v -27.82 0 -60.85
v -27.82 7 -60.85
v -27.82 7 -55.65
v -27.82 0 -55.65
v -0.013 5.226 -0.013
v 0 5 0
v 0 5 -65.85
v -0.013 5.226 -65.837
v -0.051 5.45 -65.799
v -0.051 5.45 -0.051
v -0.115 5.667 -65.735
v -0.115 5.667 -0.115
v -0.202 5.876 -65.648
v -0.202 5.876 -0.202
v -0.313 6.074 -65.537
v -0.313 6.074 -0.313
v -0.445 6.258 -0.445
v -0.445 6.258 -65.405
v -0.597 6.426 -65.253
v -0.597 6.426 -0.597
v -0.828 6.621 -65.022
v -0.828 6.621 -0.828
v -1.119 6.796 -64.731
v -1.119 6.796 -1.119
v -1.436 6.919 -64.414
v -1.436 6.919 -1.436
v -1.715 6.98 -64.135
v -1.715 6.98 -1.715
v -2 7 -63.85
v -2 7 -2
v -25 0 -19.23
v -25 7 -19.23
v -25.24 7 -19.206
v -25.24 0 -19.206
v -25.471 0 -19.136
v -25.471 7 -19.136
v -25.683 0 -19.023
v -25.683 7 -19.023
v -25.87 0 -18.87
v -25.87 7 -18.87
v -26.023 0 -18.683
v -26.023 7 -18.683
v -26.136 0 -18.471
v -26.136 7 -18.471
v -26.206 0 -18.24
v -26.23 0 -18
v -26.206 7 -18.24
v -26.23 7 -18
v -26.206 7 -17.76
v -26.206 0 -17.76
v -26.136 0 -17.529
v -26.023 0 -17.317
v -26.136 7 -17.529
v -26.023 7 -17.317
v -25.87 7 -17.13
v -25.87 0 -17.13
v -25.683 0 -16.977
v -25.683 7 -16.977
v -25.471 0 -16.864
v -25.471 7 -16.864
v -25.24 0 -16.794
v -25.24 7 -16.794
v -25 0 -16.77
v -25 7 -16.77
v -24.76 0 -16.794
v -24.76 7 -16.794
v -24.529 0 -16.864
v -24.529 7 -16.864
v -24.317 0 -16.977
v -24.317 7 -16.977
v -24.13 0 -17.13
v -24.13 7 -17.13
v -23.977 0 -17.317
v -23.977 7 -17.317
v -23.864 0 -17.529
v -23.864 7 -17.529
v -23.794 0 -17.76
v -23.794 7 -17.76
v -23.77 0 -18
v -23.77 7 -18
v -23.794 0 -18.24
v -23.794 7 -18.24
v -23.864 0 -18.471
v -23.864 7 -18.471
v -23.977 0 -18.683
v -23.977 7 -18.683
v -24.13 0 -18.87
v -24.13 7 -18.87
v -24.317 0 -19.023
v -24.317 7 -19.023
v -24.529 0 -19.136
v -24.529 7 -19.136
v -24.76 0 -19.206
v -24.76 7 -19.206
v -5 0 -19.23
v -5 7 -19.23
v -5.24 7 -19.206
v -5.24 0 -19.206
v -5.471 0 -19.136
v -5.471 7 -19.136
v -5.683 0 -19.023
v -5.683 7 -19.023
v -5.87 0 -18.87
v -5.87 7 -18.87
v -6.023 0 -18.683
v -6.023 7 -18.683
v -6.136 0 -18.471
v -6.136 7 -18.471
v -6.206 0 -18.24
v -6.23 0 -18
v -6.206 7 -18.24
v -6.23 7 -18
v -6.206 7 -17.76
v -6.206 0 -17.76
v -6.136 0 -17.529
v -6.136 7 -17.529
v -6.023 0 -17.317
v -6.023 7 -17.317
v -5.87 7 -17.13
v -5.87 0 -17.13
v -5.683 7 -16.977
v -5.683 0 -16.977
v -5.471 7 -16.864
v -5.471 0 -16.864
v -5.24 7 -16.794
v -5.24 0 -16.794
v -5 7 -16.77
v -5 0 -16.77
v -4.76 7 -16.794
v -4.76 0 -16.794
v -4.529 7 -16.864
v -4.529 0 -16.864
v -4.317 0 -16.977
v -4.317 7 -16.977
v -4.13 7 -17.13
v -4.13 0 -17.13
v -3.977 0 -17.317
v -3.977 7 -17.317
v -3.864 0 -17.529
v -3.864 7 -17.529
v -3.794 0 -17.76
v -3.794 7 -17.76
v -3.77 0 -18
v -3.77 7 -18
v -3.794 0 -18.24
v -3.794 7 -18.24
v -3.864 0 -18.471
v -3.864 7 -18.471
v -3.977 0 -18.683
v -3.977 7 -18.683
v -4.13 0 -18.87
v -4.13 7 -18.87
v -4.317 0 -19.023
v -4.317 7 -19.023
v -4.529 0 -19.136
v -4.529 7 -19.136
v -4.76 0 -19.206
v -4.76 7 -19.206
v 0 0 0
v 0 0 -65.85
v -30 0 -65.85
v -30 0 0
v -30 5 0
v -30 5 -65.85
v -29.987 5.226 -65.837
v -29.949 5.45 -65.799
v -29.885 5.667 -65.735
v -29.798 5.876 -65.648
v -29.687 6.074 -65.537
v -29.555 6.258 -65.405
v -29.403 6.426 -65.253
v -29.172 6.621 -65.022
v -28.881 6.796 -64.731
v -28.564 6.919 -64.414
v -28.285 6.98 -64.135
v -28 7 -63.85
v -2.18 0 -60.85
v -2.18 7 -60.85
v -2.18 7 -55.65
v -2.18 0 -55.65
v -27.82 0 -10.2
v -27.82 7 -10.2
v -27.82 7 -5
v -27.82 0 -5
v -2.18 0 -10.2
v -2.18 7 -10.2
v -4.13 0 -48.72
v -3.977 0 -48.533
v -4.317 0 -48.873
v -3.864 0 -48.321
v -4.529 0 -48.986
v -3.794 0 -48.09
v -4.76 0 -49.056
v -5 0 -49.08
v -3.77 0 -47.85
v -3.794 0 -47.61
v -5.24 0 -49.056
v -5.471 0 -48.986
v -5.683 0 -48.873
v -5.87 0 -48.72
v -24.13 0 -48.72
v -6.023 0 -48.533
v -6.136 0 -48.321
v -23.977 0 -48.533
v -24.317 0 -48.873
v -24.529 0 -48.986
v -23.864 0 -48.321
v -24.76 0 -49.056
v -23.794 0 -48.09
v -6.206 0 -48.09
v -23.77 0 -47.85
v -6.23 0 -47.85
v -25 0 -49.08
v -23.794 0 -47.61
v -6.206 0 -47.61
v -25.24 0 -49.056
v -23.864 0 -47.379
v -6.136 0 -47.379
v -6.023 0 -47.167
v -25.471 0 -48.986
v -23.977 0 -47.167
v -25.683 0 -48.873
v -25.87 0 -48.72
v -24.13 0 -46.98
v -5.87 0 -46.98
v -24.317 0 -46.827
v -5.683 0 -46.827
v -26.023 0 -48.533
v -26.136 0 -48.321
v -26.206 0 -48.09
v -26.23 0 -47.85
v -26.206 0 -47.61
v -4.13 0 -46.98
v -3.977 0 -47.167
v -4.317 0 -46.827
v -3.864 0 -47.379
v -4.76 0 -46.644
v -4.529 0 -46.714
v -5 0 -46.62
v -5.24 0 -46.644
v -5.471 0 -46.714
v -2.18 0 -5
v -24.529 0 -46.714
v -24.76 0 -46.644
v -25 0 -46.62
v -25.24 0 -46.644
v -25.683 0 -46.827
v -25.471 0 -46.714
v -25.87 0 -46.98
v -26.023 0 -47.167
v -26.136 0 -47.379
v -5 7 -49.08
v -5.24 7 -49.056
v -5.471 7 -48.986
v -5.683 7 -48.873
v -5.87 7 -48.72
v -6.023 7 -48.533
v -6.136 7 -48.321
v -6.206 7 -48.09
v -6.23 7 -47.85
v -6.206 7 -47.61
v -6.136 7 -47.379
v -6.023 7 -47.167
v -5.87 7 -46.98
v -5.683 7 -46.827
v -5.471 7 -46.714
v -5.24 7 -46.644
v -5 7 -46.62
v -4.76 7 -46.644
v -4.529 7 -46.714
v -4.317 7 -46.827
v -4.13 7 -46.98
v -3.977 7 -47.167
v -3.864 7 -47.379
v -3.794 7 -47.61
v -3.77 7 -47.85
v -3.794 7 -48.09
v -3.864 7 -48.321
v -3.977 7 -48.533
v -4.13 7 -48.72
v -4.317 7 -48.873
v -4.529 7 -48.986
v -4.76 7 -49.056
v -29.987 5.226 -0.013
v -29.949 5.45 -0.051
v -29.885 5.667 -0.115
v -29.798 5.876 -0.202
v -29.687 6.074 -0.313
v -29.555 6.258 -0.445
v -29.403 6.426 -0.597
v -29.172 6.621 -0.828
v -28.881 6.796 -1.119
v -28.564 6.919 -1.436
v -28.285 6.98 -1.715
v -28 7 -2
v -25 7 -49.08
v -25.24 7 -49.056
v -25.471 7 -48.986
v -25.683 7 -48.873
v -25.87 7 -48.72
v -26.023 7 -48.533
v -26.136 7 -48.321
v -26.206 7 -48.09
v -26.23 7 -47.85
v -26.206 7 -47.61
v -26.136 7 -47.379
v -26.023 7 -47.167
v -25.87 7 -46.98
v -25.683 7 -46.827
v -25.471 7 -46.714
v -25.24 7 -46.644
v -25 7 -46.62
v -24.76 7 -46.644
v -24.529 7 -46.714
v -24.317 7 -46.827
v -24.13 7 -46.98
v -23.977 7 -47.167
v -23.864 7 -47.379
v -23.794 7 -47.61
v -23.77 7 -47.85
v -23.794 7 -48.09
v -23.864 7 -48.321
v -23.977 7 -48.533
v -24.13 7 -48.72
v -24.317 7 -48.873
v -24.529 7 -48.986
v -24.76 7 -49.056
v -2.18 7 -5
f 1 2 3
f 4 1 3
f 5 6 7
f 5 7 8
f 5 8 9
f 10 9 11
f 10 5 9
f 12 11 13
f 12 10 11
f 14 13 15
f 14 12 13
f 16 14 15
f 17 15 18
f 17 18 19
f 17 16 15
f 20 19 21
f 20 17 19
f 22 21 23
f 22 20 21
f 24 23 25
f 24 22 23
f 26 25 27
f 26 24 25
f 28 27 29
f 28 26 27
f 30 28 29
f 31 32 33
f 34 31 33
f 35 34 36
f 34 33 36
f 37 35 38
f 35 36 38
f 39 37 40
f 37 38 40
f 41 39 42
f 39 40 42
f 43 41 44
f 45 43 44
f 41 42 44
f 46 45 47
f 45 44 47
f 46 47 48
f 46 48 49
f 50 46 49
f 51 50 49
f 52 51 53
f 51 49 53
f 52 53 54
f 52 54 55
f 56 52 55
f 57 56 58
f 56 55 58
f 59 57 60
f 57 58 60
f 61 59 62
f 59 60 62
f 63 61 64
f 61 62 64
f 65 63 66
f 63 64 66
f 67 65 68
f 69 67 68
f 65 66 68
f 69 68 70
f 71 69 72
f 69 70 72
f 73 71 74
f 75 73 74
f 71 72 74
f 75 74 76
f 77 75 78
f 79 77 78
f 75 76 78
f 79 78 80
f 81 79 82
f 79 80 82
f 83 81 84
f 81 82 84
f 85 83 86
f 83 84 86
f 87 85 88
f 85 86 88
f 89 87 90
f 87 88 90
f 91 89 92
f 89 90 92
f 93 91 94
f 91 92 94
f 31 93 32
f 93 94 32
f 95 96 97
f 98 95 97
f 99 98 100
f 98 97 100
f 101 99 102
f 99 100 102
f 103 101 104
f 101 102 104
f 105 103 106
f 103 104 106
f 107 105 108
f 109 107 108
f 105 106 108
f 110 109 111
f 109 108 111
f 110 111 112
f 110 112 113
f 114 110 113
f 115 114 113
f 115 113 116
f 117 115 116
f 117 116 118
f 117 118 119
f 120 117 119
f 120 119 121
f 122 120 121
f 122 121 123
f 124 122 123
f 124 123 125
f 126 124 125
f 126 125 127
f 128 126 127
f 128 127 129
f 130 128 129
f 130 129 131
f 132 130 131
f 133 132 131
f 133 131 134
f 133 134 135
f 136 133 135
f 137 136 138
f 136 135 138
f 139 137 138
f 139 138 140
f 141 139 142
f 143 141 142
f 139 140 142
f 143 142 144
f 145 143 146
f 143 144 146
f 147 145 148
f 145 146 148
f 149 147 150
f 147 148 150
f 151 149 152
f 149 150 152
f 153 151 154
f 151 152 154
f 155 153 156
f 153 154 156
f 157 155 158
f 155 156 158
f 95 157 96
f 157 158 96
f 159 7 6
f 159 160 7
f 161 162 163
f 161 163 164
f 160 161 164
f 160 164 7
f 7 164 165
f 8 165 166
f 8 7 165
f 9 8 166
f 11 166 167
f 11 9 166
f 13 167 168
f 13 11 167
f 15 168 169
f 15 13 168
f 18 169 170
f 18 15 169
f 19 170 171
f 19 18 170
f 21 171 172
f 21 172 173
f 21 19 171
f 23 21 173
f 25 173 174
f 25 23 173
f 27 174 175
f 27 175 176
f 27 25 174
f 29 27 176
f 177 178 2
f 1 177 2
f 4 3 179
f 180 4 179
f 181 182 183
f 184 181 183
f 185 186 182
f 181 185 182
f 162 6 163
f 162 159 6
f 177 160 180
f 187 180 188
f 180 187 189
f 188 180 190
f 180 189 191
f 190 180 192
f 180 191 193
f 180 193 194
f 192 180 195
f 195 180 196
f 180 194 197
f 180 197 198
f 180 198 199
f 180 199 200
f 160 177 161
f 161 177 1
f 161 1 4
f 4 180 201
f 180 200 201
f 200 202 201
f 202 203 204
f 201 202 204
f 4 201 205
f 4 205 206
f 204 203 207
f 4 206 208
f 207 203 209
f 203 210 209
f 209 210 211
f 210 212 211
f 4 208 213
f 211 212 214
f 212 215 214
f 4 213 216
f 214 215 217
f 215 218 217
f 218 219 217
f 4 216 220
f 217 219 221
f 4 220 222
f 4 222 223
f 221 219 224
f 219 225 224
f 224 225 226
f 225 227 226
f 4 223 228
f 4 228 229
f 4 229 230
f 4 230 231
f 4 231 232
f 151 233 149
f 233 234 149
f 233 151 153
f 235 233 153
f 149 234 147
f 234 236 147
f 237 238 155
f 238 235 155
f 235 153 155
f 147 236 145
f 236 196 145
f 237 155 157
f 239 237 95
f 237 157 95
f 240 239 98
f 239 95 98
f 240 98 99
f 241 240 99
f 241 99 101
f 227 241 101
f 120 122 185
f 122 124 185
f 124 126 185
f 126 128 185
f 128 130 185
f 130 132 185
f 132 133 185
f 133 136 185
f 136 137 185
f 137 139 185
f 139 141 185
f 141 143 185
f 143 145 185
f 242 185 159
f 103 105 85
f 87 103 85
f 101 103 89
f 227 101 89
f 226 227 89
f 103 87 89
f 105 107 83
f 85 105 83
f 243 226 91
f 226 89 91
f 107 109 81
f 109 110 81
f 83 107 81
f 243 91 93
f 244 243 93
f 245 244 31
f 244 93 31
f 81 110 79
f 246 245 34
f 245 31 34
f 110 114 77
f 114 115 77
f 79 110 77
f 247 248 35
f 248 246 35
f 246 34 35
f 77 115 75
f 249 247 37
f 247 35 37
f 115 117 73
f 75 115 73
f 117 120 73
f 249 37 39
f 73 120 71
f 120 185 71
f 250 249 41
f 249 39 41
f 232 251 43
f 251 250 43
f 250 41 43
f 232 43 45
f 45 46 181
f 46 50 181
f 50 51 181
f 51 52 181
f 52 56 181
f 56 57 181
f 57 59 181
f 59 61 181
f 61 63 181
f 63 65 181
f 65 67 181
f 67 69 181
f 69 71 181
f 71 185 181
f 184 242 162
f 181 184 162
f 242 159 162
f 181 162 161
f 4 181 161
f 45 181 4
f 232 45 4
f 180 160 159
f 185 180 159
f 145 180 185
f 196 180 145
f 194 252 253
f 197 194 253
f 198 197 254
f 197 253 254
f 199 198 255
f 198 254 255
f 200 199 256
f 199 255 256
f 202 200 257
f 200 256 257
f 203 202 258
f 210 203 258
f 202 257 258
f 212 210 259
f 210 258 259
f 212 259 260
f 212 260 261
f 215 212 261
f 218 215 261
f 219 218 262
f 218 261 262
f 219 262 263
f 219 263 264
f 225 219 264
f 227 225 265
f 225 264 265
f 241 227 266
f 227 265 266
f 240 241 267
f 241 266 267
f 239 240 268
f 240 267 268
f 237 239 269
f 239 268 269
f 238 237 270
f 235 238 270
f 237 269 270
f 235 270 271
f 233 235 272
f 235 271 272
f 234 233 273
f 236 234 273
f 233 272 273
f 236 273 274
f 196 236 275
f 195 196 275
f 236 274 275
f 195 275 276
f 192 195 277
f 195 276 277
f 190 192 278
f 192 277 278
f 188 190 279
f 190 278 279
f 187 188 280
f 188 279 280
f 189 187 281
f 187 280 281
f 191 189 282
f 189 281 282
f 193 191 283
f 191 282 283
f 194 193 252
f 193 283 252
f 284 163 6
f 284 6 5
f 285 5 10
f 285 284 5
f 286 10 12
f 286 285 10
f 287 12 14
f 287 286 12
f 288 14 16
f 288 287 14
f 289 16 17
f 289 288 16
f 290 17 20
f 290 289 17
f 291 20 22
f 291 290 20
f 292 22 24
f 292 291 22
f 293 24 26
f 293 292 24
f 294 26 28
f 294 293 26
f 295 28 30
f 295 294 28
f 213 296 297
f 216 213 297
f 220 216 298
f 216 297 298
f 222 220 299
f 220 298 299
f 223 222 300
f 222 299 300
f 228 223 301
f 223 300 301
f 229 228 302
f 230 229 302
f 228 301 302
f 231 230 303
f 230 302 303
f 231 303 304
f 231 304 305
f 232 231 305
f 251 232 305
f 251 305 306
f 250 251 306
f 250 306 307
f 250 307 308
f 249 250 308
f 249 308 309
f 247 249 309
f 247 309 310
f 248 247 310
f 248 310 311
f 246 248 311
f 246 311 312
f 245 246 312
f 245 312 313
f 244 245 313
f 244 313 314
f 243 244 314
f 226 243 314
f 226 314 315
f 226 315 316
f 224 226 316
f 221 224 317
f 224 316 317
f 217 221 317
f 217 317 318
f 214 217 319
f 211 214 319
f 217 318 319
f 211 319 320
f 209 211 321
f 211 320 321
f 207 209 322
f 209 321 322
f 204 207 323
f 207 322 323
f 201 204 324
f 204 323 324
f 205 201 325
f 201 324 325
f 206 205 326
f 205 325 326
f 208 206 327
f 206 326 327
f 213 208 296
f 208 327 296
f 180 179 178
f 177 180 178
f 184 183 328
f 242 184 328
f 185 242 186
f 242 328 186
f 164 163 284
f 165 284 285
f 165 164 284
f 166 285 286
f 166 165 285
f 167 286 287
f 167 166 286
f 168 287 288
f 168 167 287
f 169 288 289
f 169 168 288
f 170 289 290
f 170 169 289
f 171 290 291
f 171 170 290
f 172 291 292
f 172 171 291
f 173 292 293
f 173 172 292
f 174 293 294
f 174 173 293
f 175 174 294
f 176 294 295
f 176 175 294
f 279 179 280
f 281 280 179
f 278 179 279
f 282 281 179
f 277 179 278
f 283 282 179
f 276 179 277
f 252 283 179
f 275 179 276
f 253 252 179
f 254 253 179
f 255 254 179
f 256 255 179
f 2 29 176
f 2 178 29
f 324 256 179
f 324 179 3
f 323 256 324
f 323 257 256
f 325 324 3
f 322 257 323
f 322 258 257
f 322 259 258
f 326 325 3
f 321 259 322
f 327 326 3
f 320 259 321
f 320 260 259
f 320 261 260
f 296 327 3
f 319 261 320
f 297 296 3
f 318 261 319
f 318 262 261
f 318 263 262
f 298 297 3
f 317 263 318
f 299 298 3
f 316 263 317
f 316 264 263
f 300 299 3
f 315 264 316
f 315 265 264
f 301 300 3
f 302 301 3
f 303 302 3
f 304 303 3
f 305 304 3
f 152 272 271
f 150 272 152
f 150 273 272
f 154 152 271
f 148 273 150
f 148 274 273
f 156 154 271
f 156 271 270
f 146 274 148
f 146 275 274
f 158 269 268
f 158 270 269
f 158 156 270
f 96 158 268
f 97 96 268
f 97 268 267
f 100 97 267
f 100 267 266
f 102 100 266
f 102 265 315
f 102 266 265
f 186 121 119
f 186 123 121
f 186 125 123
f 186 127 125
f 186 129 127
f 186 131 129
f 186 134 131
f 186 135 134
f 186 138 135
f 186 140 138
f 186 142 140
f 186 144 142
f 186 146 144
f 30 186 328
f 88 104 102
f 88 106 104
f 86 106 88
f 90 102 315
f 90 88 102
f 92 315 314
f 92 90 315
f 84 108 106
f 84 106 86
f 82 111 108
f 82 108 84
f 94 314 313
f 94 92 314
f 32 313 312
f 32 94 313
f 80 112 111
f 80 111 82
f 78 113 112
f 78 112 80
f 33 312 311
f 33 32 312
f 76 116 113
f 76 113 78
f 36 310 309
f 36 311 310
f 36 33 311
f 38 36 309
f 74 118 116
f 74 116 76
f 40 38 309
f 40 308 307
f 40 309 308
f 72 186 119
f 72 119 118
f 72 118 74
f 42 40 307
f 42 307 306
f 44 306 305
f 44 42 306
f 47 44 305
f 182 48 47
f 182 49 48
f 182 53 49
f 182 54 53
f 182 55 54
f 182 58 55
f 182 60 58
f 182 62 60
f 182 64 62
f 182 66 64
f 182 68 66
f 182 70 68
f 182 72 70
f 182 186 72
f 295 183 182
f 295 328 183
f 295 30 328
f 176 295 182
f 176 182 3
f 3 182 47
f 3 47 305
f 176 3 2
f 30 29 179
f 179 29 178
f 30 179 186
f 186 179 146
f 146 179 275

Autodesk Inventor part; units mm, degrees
ref_plane "YZ Plane" through (0, 0, 0) normal (1, 0, 0) x (0, 1, 0)
ref_plane "XZ Plane" through (0, 0, 0) normal (0, 1, 0) x (-1, 0, 0)
ref_plane "XY Plane" through (0, 0, 0) normal (0, 0, 1) x (1, 0, 0)
sketch "Sketch1" plane through (0, 0, 0) normal (0, 1, 0) x (-1, 0, 0)
  line L0 (0, 0) -> (30, 0)
  line L1 (30, 0) -> (30, -65.85)
  line L2 (30, -65.85) -> (0, -65.85)
  line L3 (0, -65.85) -> (0, 0)
  dimension "d0" = 30
  dimension "d1" = 65.85
extrude "Extrusion1" add sketch "Sketch1" along normal blind 7
sketch "Sketch2" plane through (0, 7, 0) normal (0, 1, 0) x (1, 0, 0)
  line L0 (-27.82, 5) -> (-2.18, 5)
  line L1 (-2.18, 5) -> (-2.18, 10.2)
  line L2 (-2.18, 10.2) -> (-27.82, 10.2)
  line L3 (-27.82, 10.2) -> (-27.82, 5)
  line L4 (-27.82, 55.65) -> (-2.18, 55.65)
  line L5 (-2.18, 55.65) -> (-2.18, 60.85)
  line L6 (-2.18, 60.85) -> (-27.82, 60.85)
  line L7 (-27.82, 60.85) -> (-27.82, 55.65)
  line L8 (-30, 0) -> (0, 0) projected
  line L9 (-15, 10.2) -> (-15, 55.65) construction
  line L10 (-30, 65.85) -> (-30, 0) construction
  line L11 (0, 65.85) -> (-30, 65.85) construction
  point P0 (-15, 5)
  point P1 (-15, 0)
  point P2 (-15, 32.925)
  point P3 (-30, 32.925)
  dimension "d4" = 25.64
  dimension "d5" = 5.2
  dimension "d6" = 5
extrude "Extrusion2" cut sketch "Sketch2" against normal up to next
sketch "Sketch3" plane through (0, 0, 0) normal (0, -1, 0) x (1, 0, 0)
  line L0 (-25, -47.85) -> (-5, -18) construction
  line L1 (-30, -65.85) -> (0, -65.85) construction
  line L2 (0, -65.85) -> (0, 0) construction
  point P0 (-25, -18)
  point P1 (-5, -47.85)
  point P2 (-15, -32.925)
  point P3 (-15, -65.85)
  point P4 (0, -32.925)
  dimension "d9" = 29.85
  dimension "d10" = 20
hole "Hole1" at (-25, 0, -47.85) at (-25, 0, -18) at (-5, 0, -18) at (-5, 0, -47.85) direction (0, 1, 0) diameter 2.46 end through all
fillet "Fillet1" radius 2 4 edges at (-30, 7, -32.925) (0, 7, -32.925) (-15, 7, -65.85) (-15, 7, 0)
properties part number "Tilt_Camera_Mount_Plate"
